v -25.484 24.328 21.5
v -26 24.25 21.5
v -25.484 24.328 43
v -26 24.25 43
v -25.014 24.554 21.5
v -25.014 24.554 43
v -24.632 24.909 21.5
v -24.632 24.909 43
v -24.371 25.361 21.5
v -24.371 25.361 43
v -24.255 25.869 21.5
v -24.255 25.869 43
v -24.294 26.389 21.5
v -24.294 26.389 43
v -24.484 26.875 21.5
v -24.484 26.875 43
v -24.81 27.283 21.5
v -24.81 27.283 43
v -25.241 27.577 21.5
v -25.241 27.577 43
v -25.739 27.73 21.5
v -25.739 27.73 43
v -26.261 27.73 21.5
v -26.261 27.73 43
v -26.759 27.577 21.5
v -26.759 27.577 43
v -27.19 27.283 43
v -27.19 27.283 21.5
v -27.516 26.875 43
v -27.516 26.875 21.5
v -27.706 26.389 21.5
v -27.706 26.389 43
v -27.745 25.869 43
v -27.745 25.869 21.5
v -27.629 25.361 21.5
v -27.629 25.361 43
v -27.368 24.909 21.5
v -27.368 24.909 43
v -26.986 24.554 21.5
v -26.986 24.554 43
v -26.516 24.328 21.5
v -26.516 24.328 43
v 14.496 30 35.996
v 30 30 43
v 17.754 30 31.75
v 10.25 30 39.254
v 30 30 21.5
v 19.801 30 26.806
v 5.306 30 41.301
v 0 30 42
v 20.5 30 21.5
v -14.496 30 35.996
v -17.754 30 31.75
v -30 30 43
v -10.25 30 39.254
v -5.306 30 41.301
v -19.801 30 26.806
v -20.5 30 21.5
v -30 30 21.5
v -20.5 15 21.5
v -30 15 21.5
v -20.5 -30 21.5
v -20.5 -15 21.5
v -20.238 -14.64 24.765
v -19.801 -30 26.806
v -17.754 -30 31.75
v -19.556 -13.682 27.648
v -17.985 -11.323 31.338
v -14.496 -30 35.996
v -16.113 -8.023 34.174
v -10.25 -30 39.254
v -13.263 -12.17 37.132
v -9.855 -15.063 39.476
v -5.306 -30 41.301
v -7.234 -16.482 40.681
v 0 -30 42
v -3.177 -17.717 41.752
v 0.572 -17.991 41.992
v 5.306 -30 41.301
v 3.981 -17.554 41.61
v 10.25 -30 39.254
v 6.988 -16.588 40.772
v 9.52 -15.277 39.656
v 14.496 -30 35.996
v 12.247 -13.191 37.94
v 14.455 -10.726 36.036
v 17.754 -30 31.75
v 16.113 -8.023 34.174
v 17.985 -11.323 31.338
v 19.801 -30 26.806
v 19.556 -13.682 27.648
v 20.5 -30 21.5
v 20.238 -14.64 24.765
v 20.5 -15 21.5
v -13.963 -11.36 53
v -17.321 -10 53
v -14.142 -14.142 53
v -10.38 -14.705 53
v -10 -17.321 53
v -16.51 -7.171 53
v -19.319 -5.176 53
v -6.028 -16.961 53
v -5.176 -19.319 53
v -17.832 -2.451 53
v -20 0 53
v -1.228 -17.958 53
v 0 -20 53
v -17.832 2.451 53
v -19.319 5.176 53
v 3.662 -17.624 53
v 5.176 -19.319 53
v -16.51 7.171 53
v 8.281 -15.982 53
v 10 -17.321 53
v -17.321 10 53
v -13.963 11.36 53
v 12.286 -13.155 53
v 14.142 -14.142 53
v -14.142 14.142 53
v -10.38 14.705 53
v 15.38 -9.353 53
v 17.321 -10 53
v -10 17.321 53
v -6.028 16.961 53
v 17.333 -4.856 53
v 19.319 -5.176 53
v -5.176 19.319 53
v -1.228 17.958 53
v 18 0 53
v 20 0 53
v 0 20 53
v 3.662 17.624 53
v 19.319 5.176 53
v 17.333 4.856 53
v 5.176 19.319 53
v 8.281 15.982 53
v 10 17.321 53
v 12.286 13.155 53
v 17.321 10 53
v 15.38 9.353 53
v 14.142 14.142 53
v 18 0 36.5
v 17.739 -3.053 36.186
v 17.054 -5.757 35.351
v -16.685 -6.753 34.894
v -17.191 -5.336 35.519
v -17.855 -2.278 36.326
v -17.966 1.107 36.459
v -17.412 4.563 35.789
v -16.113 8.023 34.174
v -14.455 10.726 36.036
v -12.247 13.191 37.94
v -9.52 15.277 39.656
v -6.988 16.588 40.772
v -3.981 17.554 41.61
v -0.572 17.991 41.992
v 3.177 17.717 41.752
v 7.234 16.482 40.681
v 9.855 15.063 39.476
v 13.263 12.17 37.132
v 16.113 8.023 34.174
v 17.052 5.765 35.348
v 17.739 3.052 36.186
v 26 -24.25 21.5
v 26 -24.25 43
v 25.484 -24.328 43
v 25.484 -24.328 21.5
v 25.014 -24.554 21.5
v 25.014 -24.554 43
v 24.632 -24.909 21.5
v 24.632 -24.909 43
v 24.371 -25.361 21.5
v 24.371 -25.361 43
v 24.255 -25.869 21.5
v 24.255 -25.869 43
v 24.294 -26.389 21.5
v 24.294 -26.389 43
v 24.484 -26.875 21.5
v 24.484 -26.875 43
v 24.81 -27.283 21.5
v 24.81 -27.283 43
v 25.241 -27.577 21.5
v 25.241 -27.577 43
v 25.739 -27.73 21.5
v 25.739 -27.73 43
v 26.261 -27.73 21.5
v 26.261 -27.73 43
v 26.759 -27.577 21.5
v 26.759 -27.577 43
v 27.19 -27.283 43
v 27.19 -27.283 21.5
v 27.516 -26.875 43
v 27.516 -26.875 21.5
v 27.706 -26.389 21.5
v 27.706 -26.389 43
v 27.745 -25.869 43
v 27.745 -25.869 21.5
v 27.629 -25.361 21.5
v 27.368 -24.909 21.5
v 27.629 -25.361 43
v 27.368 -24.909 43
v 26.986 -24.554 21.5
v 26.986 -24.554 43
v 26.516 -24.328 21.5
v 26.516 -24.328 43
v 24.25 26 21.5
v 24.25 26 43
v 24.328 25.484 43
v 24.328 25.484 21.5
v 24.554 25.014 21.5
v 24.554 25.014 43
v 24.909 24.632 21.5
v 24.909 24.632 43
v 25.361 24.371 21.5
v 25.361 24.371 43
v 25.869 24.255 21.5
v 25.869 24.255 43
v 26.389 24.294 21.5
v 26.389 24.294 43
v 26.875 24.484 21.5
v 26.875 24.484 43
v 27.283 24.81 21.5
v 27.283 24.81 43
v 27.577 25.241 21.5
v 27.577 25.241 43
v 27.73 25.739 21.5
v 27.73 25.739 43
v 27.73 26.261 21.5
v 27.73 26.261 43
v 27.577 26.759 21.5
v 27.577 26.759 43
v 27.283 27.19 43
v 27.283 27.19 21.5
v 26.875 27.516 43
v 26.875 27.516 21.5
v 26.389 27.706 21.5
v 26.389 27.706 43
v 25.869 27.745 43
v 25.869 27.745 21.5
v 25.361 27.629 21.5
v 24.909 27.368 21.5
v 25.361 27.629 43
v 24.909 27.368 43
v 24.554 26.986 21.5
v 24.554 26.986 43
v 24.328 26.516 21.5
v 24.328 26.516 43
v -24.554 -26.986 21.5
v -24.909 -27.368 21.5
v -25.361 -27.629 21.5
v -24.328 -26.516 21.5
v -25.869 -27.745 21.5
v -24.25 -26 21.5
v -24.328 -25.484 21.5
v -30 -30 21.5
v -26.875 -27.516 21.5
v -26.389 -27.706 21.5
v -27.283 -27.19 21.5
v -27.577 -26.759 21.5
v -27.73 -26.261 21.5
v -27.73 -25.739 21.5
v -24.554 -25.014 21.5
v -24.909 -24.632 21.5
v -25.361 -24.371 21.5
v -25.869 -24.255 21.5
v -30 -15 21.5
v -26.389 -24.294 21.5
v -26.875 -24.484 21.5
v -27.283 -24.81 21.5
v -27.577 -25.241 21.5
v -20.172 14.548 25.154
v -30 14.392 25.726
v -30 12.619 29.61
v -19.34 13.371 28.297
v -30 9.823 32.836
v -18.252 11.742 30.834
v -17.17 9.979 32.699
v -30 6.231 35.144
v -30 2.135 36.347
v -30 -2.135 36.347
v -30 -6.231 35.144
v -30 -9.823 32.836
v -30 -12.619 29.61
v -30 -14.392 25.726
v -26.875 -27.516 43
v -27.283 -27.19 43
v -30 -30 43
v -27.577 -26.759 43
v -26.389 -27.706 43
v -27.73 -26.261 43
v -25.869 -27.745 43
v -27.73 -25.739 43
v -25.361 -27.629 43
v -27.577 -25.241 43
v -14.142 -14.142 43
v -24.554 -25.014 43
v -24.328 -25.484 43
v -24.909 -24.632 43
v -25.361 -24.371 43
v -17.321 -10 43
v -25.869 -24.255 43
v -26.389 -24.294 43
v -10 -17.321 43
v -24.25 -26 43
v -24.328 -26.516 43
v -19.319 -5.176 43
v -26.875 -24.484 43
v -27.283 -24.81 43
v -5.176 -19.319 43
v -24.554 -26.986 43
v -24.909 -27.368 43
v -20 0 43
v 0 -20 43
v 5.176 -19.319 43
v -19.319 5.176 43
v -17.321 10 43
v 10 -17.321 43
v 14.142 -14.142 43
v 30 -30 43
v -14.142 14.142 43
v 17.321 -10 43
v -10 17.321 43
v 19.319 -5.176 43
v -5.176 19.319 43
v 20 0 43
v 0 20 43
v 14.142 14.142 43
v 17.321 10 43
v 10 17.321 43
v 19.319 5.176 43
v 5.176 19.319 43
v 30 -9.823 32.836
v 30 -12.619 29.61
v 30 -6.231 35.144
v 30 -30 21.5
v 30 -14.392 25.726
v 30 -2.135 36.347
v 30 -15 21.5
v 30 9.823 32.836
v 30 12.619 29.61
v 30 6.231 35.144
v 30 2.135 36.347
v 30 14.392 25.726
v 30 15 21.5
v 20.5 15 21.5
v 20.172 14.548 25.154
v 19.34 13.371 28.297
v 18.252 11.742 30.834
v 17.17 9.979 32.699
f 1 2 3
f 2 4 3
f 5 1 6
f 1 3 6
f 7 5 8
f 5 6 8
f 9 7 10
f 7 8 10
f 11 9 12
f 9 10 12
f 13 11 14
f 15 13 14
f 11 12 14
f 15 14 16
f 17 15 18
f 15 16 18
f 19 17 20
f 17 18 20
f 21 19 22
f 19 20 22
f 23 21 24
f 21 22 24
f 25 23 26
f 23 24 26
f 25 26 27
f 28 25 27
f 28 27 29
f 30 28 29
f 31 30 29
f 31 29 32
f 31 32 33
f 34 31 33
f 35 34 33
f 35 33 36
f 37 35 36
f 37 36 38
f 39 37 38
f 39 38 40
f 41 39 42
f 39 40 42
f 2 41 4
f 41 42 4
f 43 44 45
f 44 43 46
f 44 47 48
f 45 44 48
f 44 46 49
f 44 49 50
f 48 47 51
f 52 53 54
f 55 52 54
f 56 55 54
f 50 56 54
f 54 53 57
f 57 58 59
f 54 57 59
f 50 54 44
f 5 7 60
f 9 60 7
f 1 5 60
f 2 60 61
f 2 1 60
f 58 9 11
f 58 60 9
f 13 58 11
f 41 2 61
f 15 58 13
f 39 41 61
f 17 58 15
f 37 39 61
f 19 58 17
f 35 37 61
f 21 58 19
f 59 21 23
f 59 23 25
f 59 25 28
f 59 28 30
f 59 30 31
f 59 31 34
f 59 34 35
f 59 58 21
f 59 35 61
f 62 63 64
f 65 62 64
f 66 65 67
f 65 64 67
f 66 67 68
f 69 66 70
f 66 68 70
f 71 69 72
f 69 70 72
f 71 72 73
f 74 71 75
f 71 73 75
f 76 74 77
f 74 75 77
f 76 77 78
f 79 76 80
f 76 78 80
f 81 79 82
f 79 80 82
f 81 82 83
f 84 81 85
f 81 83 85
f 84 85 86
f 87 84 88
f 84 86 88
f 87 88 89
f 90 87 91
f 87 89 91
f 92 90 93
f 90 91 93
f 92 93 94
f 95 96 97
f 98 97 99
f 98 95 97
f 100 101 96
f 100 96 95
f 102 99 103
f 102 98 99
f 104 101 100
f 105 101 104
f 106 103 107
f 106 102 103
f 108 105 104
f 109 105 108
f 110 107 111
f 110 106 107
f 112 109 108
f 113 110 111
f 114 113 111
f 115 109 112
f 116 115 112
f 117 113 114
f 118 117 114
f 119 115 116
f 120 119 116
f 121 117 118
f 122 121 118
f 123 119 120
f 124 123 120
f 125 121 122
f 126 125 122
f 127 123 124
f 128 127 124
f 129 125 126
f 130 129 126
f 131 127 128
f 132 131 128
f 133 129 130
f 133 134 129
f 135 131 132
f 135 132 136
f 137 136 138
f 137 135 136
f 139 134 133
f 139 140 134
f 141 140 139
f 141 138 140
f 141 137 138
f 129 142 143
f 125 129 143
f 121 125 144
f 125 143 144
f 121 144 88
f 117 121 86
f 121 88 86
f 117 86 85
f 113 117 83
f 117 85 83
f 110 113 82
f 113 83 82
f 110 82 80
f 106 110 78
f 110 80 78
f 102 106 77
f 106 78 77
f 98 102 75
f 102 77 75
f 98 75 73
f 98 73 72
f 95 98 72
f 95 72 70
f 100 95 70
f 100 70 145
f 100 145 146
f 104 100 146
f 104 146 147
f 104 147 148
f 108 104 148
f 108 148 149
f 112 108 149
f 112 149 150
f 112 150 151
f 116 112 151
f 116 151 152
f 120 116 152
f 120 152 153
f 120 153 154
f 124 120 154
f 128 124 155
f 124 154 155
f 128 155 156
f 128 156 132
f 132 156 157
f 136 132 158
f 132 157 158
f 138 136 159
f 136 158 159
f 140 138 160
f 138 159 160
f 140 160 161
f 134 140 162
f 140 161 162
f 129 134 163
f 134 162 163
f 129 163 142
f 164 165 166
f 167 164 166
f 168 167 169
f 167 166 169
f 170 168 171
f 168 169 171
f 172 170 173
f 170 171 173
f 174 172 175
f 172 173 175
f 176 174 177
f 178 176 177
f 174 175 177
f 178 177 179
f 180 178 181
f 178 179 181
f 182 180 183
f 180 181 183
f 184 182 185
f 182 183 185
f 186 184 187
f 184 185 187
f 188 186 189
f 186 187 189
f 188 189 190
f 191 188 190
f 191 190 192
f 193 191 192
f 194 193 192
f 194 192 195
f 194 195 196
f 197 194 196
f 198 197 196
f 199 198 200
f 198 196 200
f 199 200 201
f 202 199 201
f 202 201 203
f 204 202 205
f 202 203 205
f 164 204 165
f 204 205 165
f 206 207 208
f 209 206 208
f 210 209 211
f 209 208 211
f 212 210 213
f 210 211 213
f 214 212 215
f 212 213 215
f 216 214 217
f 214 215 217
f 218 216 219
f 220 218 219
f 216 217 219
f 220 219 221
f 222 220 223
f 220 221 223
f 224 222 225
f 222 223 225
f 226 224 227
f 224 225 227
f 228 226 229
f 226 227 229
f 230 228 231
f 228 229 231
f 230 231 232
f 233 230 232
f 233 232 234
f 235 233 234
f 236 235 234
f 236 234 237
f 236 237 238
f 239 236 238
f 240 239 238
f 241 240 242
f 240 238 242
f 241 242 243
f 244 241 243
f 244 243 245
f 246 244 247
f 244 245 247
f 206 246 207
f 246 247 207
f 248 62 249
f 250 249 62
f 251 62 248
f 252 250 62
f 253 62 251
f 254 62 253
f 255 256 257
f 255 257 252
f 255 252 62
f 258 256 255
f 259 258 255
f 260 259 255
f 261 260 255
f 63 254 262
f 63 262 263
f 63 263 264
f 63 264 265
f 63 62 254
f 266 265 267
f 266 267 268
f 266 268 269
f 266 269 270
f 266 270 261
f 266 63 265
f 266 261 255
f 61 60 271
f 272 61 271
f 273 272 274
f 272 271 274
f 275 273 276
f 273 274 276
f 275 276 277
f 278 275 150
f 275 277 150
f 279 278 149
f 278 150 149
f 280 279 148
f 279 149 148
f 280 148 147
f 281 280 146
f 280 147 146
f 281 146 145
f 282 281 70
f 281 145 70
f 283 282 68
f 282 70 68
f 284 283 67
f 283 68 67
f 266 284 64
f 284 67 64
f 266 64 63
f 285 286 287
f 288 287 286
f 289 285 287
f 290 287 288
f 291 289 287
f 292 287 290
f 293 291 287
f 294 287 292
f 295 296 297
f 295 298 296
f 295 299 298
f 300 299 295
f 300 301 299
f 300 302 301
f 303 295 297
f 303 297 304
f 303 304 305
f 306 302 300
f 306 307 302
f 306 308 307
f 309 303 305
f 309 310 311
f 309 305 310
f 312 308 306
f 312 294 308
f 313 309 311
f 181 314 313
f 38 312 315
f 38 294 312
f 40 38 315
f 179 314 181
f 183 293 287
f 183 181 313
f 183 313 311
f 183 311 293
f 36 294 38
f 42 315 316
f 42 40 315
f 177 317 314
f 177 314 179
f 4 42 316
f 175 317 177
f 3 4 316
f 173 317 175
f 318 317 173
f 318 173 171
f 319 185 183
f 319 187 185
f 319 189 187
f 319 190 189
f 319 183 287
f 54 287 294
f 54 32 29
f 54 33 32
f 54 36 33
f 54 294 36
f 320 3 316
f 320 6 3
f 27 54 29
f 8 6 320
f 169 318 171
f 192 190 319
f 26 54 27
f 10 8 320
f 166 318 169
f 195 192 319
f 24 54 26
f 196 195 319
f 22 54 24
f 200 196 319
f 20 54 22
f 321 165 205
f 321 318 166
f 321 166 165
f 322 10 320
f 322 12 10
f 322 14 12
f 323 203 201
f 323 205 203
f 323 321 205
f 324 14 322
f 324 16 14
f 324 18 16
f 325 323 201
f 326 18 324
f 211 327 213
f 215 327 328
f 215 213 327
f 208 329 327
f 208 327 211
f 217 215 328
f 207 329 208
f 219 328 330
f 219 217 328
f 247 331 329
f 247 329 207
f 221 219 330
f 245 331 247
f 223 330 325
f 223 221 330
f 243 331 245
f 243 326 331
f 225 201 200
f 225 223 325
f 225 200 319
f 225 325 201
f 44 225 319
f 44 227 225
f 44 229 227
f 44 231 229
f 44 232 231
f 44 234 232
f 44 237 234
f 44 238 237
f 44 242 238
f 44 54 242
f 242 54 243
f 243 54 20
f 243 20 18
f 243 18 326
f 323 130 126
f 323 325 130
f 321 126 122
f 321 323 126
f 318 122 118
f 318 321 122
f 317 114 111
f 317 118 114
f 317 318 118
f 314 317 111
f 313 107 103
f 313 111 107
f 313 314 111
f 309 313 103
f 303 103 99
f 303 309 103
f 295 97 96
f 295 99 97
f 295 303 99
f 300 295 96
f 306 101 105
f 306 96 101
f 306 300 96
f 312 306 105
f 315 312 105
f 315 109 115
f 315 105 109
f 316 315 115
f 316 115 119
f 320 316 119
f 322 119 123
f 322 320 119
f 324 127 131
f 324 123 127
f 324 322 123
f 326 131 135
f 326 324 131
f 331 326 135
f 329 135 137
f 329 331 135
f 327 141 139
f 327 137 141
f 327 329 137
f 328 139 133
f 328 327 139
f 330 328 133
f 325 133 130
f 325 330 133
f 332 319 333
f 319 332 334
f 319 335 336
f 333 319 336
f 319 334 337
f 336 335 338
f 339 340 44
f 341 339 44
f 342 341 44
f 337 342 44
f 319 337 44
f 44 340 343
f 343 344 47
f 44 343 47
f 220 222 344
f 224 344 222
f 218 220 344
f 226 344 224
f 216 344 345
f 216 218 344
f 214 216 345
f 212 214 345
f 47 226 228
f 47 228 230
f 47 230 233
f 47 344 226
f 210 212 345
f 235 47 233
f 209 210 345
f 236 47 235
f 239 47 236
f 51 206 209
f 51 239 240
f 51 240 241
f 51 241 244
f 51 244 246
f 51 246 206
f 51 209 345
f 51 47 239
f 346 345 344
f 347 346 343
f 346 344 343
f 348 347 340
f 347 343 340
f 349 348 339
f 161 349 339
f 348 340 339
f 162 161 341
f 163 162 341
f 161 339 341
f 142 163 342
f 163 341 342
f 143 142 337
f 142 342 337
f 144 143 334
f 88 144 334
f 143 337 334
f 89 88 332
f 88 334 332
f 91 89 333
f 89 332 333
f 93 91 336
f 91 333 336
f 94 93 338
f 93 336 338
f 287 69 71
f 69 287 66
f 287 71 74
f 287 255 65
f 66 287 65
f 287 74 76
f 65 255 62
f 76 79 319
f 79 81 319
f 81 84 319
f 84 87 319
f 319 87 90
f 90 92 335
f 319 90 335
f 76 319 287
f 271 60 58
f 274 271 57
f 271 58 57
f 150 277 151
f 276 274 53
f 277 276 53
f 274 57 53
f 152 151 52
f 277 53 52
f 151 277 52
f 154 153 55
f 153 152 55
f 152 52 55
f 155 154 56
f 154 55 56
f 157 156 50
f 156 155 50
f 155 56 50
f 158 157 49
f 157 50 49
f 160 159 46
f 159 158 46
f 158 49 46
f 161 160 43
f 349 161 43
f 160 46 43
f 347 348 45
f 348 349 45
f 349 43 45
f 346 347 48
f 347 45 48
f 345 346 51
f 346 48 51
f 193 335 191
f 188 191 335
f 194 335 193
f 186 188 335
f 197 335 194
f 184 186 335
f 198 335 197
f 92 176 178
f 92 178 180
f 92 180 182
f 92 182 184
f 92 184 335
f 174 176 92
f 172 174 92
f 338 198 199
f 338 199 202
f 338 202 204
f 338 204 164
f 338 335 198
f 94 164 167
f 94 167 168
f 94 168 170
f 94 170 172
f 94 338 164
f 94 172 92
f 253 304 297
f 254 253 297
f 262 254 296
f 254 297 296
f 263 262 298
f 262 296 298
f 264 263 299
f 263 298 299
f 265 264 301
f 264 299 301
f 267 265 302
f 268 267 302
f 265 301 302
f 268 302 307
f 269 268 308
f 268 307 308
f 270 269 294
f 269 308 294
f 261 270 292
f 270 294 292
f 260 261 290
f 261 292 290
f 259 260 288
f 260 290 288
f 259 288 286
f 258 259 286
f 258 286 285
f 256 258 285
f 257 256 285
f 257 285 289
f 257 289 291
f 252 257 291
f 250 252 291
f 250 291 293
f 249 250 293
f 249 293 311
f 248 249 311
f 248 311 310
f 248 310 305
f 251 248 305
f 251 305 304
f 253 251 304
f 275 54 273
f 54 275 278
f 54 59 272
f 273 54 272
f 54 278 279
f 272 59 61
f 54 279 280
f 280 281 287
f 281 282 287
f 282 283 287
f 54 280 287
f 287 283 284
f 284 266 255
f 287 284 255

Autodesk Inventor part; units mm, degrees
ref_plane "YZ Plane" through (0, 0, 0) normal (1, 0, 0) x (0, 1, 0)
ref_plane "XZ Plane" through (0, 0, 0) normal (0, 1, 0) x (-1, 0, 0)
ref_plane "XY Plane" through (0, 0, 0) normal (0, 0, 1) x (1, 0, 0)
sketch "Sketch1" plane through (0, 0, 0) normal (0, 0, 1) x (1, 0, 0)
  line L0 (-30, -30) -> (30, -30)
  line L1 (30, -30) -> (30, 30)
  line L2 (30, 30) -> (-30, 30)
  line L3 (-30, 30) -> (-30, -30)
  line L4 (-30, -30) -> (30, 30) construction
  line L5 (30, -30) -> (-30, 30) construction
  point P0 (0, 0)
  dimension "d0" = 60
  dimension "d1" = 60
extrude "Extrusion1" add sketch "Sketch1" along normal blind 43
sketch "Sketch2" plane through (0, 0, 43) normal (0, 0, 1) x (1, 0, 0)
  circle A0 centre (0, 0) radius 18
  dimension "d4" = 36
extrude "Extrusion2" cut sketch "Sketch2" against normal blind 43
sketch "Sketch3" plane through (30, -30, 0) normal (1, 0, 0) x (0, 0, -1)
  line L0 (0, 0) -> (0, 60) projected
  line L1 (0, 60) -> (-43, 60) projected
  line L2 (-43, 0) -> (-43, 60) projected
  line L3 (0, 0) -> (-43, 0) projected
  circle A0 centre (-21.5, 30) radius 15
  point P0 (0, 30)
  dimension "d7" = 30
  dimension "d8" = 21.5
  dimension "d9" = 30
  dimension "d10" = 60
  dimension "d11" = 43
extrude "Extrusion3" cut sketch "Sketch3" against normal blind 430 contours A0
sketch "Sketch4" plane through (-30, 30, 0) normal (0, 1, 0) x (1, 0, 0)
  line L0 (60, 0) -> (0, 0) projected
  line L1 (0, 0) -> (0, -43) projected
  line L2 (60, -43) -> (0, -43) projected
  line L3 (60, 0) -> (60, -43) projected
  circle A0 centre (30, -21.5) radius 20.5
  point P0 (30, 0)
  dimension "d14" = 41
  dimension "d15" = 60
  dimension "d16" = 43
  dimension "d17" = 21.5
  dimension "d18" = 30
extrude "Extrusion4" cut sketch "Sketch4" against normal blind 430 contours A0
sketch "Sketch5" plane through (0, 0, 43) normal (0, 0, 1) x (1, 0, 0)
  circle A0 centre (0, 0) radius 18 projected
  line L0 (-30, -30) -> (30, -30) projected
  line L1 (30, -30) -> (30, 30) projected
  line L2 (30, 30) -> (-30, 30) projected
  line L3 (-30, 30) -> (-30, -30) projected
  circle A1 centre (0, 0) radius 20
  dimension "d21" = 2
extrude "Extrusion5" add sketch "Sketch5" along normal blind 10 contours A1
sketch "Sketch6" plane through (0, 0, 43) normal (0, 0, 1) x (1, 0, 0)
  circle A0 centre (0, 0) radius 20 projected
  line L0 (-30, -30) -> (30, -30) projected
  line L1 (30, -30) -> (30, 30) projected
  line L2 (30, 30) -> (-30, 30) projected
  line L3 (-30, 30) -> (-30, -30) projected
  circle A1 centre (-26, -26) radius 1.75
  dimension "d24" = 3.5
  dimension "d25" = 4
  dimension "d26" = 4
extrude "Extrusion6" cut sketch "Sketch6" against normal blind 500 contours A1
pattern_circular "Circular Pattern1" count 4 over 360 about axis through (0, 0, 43) along (0, 0, -1) of "Extrusion6"
sketch "Sketch7" plane through (0, 0, 0) normal (0, 0, -1) x (-1, 0, 0)
  circle A0 centre (-26, -26) radius 1.75 projected
  circle A1 centre (-26, 26) radius 1.75 projected
  circle A2 centre (26, 26) radius 1.75 projected
  circle A3 centre (26, -26) radius 1.75 projected
  circle A4 centre (0, 0) radius 18 projected
  line L0 (30, -30) -> (-30, -30) projected
  line L1 (30, 30) -> (30, -30) projected
  line L2 (-30, 30) -> (30, 30) projected
  line L3 (-30, -30) -> (-30, 30) projected
  line L4 (49.4282, -48.51) -> (-49.4282, -48.51)
  line L5 (-49.4282, -48.51) -> (-49.4282, 48.51)
  line L6 (-49.4282, 48.51) -> (49.4282, 48.51)
  line L7 (49.4282, 48.51) -> (49.4282, -48.51)
  line L8 (49.4282, -48.51) -> (-49.4282, 48.51) construction
  line L9 (-49.4282, -48.51) -> (49.4282, 48.51) construction
extrude "Extrusion7" cut sketch "Sketch7" against normal blind 21.5 contours A0 | A1 | A2 | A3 | A4 | L0 L3 L2 L1 | L4 L5 L6 L7
sketch "Sketch13" plane through (0, 0, 43) normal (0, 0, 1) x (1, 0, 0)
  circle A0 centre (0, 0) radius 20 projected
  line L0 (-30, -30) -> (30, -30) projected
  line L1 (30, -30) -> (30, 30) projected
  line L2 (30, 30) -> (-30, 30) projected
  line L3 (-30, 30) -> (-30, -30) projected
  circle A1 centre (0, 0) radius 30
  dimension "d55" = 10
equation "\"d8\" = 0.5 * d11"
equation "\"d9\" = 0.5 * d10"
equation "\"d17\" = 0.5 * d16"
equation "\"d18\" = 0.5 * d15"
equation "\"d26\" = d25"
equation "\"d32\" = 0.5 * d2"
equation "\"d2\" = 43"
properties part number "peca2"
